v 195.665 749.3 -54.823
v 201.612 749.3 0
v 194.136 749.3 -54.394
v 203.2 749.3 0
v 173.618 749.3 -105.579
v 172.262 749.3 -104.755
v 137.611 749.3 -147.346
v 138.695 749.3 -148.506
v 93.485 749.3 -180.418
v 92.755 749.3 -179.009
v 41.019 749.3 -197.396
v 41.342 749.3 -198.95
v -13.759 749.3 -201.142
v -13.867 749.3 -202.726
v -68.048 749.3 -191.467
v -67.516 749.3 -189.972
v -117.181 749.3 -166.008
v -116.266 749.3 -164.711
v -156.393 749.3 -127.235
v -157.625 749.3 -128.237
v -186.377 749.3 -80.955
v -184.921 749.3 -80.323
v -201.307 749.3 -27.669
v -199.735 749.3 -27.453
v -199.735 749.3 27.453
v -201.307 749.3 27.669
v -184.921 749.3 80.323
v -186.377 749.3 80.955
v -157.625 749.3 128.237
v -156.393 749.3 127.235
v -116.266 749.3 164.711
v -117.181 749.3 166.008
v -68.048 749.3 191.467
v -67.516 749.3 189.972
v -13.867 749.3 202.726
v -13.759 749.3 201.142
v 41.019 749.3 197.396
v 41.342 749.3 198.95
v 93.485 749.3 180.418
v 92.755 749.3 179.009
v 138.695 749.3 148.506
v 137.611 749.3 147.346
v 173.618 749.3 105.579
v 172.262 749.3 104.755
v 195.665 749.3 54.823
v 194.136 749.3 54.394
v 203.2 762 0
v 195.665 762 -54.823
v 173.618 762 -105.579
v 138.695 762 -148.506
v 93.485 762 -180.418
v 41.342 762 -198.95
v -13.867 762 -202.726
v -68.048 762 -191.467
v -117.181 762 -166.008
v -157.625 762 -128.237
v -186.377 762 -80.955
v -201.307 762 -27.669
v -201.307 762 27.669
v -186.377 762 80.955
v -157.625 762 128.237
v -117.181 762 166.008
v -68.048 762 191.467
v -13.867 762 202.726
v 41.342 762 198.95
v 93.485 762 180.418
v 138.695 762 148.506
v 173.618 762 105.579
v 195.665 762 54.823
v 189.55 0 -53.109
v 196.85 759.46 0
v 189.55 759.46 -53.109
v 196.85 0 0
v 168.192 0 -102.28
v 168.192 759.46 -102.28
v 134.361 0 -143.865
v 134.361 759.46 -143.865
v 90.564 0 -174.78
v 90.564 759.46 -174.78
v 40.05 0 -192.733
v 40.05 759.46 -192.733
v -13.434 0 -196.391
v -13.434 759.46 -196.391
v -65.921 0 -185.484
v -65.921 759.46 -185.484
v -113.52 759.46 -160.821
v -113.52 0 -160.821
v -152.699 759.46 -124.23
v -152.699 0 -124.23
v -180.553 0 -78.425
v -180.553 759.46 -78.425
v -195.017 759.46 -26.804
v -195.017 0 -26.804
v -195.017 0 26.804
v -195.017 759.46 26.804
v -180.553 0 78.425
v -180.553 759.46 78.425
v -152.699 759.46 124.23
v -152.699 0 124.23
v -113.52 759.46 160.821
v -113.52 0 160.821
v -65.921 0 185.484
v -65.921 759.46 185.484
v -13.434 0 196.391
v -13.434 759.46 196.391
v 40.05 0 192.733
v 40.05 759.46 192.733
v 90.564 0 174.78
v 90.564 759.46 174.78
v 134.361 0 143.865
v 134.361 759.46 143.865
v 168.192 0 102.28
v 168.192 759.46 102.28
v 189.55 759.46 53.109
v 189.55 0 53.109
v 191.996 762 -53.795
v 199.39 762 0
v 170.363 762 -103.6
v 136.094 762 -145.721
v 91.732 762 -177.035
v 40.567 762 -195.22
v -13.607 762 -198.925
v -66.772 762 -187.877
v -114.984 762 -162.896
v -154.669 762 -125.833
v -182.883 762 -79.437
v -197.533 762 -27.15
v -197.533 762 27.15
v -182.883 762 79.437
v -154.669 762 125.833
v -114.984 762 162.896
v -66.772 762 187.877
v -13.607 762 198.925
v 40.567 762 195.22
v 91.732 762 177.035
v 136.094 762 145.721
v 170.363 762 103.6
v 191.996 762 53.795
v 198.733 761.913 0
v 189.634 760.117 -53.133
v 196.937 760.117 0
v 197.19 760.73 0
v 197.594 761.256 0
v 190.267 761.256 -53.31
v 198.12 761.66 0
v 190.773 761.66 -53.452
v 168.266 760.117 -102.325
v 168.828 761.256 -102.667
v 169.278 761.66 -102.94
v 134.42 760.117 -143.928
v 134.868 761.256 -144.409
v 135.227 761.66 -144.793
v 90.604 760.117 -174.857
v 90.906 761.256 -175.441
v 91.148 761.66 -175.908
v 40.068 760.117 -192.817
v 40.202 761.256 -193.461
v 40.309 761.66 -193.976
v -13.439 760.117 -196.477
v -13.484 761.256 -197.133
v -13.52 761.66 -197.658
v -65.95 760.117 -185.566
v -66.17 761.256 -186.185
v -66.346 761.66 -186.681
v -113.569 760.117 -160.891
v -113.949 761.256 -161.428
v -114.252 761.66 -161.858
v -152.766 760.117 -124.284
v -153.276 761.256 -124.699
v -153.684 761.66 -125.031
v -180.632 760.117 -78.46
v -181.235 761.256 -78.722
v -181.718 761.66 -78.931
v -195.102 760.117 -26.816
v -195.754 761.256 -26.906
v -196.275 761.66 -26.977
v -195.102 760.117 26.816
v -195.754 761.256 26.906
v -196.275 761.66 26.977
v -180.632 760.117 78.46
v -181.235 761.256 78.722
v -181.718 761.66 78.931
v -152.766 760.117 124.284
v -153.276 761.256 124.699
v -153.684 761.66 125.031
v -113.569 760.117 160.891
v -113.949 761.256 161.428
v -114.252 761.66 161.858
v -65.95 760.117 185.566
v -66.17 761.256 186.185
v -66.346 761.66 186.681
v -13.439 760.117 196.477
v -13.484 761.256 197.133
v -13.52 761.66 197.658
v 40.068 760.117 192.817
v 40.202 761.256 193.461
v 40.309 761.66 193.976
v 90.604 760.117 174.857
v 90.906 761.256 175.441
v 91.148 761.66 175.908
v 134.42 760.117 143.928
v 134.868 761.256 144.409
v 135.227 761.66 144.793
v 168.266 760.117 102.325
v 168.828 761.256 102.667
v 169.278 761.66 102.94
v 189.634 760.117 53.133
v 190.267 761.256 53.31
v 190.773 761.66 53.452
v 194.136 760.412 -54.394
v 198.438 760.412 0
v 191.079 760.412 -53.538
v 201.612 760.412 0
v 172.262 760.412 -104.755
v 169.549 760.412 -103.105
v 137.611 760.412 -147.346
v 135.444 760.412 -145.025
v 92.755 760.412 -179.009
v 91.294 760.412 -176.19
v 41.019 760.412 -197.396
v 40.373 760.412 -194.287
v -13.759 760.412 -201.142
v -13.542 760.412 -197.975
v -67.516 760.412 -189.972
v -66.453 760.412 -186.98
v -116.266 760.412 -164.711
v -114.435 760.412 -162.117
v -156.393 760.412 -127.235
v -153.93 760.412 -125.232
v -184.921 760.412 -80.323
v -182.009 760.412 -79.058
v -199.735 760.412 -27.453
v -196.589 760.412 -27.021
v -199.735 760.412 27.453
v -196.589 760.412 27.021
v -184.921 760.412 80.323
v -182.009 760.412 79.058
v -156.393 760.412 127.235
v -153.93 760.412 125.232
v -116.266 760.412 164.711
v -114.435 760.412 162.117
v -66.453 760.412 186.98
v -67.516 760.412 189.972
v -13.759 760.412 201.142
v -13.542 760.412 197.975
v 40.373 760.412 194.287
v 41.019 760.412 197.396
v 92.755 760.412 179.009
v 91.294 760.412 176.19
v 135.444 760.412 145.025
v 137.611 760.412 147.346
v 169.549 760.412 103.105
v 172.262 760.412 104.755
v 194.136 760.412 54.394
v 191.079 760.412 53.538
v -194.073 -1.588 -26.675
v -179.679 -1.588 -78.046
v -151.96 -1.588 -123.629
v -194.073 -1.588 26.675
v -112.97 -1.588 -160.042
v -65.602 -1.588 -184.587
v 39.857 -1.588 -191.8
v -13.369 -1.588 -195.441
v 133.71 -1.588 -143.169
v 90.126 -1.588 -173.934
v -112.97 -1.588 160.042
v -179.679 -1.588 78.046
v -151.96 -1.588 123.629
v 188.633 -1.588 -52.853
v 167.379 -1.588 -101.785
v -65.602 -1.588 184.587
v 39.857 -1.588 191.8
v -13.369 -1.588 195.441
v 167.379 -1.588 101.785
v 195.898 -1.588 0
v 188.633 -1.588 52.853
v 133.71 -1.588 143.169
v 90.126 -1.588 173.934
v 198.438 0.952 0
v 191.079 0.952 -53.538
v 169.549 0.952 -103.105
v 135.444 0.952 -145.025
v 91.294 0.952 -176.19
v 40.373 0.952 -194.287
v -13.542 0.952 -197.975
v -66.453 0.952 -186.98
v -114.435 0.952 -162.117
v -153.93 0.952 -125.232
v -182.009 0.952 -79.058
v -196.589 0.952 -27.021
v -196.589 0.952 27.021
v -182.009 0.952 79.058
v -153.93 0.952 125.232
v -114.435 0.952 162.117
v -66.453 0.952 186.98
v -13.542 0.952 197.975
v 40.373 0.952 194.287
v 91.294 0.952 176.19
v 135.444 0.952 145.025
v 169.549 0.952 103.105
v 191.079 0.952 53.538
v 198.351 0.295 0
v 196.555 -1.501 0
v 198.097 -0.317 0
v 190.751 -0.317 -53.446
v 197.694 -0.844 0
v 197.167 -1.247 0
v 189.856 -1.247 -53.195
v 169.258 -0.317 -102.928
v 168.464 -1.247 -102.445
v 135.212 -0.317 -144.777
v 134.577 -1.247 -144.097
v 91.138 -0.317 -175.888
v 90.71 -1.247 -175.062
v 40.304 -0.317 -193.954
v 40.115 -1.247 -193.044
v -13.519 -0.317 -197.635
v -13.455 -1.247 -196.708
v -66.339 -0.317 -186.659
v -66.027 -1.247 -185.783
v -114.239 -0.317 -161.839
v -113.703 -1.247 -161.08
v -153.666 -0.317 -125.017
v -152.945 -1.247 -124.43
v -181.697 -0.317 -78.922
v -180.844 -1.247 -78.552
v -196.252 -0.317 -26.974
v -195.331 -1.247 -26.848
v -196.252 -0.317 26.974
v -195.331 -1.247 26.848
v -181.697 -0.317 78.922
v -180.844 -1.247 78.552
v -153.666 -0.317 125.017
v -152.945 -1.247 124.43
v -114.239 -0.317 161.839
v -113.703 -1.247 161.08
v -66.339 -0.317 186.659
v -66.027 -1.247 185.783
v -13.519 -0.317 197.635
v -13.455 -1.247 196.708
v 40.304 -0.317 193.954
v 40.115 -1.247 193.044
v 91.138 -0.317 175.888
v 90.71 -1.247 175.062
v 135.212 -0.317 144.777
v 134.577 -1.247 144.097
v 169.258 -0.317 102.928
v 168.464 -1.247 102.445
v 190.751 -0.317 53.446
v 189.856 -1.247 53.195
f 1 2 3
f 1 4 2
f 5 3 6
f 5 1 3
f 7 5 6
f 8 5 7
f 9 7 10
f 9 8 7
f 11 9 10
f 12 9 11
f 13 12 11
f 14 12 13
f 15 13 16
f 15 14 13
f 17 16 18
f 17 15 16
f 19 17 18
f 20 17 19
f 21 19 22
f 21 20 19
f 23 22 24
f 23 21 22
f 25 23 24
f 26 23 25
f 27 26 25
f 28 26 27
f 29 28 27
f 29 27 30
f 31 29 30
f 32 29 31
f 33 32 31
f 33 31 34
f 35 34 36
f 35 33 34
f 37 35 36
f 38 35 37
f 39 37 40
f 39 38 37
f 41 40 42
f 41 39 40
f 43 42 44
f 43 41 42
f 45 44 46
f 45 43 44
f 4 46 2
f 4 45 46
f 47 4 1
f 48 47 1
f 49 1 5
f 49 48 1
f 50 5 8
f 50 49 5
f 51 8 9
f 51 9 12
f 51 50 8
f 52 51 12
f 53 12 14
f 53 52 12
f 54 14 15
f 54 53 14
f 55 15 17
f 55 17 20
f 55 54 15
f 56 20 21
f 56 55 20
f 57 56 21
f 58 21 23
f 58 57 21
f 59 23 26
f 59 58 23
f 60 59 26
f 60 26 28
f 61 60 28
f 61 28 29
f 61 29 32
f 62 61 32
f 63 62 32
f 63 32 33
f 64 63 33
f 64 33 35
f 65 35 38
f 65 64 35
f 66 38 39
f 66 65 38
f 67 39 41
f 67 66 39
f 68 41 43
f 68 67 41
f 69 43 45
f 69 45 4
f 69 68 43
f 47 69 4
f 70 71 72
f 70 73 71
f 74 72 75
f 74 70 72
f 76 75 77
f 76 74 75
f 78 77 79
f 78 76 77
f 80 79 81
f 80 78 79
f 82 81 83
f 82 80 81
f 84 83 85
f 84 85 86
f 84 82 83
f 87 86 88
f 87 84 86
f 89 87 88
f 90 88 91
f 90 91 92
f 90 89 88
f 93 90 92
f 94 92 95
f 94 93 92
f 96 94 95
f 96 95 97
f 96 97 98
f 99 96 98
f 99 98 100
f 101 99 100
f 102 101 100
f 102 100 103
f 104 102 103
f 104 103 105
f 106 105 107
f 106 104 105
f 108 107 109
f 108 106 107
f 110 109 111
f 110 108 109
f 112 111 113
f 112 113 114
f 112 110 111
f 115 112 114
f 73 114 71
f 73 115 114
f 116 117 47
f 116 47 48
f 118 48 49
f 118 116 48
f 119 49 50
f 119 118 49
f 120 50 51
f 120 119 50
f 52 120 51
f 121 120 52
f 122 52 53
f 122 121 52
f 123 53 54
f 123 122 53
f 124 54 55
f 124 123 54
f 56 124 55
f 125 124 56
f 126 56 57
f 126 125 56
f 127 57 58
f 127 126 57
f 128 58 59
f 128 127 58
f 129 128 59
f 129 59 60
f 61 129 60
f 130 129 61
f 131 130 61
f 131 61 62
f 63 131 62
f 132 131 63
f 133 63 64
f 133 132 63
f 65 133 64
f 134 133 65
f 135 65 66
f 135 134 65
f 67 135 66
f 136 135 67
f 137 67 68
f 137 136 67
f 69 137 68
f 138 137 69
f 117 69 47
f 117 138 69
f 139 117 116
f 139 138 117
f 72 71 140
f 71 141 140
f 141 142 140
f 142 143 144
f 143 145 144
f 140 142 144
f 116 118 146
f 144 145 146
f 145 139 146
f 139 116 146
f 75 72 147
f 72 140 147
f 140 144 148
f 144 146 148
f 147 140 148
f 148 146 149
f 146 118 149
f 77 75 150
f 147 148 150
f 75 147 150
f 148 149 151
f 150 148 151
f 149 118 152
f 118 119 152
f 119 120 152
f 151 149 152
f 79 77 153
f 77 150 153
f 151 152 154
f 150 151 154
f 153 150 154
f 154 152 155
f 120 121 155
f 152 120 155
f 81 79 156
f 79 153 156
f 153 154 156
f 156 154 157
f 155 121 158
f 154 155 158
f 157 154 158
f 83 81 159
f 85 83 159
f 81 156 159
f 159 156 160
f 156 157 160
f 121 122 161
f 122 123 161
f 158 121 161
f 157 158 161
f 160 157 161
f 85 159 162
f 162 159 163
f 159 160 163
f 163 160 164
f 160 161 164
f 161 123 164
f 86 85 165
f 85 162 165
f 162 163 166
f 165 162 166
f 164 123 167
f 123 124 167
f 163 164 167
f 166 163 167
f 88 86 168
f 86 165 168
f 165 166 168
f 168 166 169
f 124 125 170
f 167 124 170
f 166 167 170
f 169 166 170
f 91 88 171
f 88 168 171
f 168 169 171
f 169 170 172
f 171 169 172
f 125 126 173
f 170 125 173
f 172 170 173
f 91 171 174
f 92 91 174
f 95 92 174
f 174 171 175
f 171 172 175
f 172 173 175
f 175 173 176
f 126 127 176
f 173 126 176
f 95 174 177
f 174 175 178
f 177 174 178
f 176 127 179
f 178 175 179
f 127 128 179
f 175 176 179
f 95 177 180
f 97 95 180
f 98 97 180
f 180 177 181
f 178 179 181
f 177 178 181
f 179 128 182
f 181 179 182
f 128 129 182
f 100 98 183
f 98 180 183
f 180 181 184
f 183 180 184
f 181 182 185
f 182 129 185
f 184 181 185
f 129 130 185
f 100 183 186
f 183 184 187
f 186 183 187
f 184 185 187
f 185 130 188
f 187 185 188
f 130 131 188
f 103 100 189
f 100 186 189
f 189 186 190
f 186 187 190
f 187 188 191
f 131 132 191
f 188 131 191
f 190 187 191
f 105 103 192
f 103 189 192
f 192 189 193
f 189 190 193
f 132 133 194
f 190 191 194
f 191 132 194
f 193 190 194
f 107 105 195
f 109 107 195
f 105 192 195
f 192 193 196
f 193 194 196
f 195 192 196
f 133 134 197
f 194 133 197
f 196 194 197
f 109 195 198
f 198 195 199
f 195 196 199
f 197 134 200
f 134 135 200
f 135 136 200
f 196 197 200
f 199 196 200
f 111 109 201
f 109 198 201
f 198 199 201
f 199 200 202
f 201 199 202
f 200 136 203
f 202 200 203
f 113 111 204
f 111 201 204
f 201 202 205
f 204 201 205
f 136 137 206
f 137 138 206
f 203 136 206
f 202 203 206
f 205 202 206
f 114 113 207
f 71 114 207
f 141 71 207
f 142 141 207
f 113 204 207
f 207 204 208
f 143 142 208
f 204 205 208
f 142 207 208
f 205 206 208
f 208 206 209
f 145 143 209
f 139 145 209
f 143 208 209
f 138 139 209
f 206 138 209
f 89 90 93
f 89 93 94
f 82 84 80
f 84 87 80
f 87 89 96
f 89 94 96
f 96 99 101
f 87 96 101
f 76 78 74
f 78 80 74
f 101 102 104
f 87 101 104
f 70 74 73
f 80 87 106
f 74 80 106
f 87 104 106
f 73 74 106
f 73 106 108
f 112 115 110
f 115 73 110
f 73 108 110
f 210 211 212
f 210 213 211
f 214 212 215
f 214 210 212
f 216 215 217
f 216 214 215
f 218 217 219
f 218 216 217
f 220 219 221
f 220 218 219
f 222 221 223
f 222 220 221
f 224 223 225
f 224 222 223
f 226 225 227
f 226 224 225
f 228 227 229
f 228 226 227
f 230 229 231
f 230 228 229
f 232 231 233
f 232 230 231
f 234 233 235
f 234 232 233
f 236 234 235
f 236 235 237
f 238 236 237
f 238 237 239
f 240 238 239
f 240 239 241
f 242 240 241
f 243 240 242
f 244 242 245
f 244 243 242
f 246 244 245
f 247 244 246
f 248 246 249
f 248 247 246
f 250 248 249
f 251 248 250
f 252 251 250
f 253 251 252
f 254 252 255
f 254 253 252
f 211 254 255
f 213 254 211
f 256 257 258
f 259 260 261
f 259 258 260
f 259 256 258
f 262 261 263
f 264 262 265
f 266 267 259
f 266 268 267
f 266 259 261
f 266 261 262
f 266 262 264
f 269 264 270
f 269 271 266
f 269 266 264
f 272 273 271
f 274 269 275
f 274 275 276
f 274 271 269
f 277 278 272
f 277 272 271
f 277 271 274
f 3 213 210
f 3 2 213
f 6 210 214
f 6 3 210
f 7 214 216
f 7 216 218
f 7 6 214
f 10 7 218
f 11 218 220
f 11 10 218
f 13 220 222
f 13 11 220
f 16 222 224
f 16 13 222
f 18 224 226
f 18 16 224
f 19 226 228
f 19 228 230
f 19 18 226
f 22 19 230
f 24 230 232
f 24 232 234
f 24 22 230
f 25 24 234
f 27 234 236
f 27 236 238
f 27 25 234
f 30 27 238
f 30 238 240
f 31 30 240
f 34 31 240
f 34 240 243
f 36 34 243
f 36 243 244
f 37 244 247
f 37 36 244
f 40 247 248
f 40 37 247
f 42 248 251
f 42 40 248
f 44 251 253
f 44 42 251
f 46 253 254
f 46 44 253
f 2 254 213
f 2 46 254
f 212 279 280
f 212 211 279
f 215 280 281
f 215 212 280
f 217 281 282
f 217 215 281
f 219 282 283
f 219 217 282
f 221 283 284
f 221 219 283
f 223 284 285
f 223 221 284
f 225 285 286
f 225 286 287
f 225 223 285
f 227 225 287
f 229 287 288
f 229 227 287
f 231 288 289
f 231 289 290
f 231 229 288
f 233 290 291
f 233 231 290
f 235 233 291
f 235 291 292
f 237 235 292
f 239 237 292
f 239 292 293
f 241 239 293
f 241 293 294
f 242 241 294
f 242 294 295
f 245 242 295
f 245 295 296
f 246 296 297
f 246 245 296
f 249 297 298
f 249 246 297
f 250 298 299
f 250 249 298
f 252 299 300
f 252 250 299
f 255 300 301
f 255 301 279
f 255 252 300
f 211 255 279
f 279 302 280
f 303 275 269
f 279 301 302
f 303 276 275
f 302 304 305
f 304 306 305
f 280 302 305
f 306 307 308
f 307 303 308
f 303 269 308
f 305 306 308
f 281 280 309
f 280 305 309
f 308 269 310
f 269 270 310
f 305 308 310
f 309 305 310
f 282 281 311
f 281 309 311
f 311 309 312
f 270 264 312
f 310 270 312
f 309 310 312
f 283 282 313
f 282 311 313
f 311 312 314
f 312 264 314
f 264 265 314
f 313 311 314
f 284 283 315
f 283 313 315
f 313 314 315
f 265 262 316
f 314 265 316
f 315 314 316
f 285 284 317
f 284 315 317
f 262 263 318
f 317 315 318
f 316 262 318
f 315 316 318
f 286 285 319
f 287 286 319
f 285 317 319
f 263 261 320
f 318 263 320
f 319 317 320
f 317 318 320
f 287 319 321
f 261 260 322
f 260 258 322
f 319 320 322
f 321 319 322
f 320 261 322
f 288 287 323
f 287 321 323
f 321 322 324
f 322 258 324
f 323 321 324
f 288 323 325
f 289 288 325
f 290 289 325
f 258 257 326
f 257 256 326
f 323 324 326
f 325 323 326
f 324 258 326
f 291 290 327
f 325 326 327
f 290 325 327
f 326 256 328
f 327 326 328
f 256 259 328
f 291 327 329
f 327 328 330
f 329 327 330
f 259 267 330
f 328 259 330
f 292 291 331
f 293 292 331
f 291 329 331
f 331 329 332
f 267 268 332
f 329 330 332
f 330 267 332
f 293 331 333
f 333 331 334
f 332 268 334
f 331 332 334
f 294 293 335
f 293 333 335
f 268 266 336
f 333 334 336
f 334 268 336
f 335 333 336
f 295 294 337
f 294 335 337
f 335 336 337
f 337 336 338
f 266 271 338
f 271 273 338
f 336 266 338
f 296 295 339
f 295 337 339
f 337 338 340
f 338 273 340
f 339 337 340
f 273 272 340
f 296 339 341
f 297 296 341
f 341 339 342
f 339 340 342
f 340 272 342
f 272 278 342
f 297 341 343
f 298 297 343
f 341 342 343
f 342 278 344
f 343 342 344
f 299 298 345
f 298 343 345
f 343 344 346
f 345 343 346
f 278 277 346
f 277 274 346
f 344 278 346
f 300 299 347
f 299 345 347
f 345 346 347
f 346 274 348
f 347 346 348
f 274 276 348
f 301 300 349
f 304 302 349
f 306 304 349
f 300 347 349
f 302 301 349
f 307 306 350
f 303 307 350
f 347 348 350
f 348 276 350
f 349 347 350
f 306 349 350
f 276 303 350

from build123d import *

# Parameters (mm, degrees)
SKETCH3_R           = 198.4375
BOSS_EXTRUDE1_DEPTH = 1.5875
FILLET1_R           = 2.54


with BuildPart() as part:
    # Sweep1: sweep along a path in Sketch1
    with BuildLine(Plane(origin=(0, 0, 0), x_dir=(1, 0, 0), z_dir=(0, 1, 0))) as sweep1_path:
        CenterArc((0, 0), 196.85, 0, 360)
    # Sketch2 → Sweep1 (sweep)
    with BuildSketch(Plane.XY):
        Polygon((196.85, 0), (196.85, 762), (203.2, 762), (203.2, 749.3), (201.6125, 749.3), (201.6125, 760.4125), (198.4375, 760.4125), (198.4375, 0), align=None)
    sweep(path=sweep1_path.line)

    # Sketch3 → Boss-Extrude1 (add)
    with BuildSketch(Plane(origin=(0, 0, 0), x_dir=(-1, 0, 0), z_dir=(0, -1, 0))):
        Circle(SKETCH3_R)
    extrude(amount=BOSS_EXTRUDE1_DEPTH)

    # Fillet1
    fillet1_edges = [part.edges().sort_by_distance(p)[0] for p in [
        (198.4375, -1.5875, 0),
        (-196.85, 762, 0),
    ]]
    fillet(fillet1_edges, radius=FILLET1_R)


solid = part.part
